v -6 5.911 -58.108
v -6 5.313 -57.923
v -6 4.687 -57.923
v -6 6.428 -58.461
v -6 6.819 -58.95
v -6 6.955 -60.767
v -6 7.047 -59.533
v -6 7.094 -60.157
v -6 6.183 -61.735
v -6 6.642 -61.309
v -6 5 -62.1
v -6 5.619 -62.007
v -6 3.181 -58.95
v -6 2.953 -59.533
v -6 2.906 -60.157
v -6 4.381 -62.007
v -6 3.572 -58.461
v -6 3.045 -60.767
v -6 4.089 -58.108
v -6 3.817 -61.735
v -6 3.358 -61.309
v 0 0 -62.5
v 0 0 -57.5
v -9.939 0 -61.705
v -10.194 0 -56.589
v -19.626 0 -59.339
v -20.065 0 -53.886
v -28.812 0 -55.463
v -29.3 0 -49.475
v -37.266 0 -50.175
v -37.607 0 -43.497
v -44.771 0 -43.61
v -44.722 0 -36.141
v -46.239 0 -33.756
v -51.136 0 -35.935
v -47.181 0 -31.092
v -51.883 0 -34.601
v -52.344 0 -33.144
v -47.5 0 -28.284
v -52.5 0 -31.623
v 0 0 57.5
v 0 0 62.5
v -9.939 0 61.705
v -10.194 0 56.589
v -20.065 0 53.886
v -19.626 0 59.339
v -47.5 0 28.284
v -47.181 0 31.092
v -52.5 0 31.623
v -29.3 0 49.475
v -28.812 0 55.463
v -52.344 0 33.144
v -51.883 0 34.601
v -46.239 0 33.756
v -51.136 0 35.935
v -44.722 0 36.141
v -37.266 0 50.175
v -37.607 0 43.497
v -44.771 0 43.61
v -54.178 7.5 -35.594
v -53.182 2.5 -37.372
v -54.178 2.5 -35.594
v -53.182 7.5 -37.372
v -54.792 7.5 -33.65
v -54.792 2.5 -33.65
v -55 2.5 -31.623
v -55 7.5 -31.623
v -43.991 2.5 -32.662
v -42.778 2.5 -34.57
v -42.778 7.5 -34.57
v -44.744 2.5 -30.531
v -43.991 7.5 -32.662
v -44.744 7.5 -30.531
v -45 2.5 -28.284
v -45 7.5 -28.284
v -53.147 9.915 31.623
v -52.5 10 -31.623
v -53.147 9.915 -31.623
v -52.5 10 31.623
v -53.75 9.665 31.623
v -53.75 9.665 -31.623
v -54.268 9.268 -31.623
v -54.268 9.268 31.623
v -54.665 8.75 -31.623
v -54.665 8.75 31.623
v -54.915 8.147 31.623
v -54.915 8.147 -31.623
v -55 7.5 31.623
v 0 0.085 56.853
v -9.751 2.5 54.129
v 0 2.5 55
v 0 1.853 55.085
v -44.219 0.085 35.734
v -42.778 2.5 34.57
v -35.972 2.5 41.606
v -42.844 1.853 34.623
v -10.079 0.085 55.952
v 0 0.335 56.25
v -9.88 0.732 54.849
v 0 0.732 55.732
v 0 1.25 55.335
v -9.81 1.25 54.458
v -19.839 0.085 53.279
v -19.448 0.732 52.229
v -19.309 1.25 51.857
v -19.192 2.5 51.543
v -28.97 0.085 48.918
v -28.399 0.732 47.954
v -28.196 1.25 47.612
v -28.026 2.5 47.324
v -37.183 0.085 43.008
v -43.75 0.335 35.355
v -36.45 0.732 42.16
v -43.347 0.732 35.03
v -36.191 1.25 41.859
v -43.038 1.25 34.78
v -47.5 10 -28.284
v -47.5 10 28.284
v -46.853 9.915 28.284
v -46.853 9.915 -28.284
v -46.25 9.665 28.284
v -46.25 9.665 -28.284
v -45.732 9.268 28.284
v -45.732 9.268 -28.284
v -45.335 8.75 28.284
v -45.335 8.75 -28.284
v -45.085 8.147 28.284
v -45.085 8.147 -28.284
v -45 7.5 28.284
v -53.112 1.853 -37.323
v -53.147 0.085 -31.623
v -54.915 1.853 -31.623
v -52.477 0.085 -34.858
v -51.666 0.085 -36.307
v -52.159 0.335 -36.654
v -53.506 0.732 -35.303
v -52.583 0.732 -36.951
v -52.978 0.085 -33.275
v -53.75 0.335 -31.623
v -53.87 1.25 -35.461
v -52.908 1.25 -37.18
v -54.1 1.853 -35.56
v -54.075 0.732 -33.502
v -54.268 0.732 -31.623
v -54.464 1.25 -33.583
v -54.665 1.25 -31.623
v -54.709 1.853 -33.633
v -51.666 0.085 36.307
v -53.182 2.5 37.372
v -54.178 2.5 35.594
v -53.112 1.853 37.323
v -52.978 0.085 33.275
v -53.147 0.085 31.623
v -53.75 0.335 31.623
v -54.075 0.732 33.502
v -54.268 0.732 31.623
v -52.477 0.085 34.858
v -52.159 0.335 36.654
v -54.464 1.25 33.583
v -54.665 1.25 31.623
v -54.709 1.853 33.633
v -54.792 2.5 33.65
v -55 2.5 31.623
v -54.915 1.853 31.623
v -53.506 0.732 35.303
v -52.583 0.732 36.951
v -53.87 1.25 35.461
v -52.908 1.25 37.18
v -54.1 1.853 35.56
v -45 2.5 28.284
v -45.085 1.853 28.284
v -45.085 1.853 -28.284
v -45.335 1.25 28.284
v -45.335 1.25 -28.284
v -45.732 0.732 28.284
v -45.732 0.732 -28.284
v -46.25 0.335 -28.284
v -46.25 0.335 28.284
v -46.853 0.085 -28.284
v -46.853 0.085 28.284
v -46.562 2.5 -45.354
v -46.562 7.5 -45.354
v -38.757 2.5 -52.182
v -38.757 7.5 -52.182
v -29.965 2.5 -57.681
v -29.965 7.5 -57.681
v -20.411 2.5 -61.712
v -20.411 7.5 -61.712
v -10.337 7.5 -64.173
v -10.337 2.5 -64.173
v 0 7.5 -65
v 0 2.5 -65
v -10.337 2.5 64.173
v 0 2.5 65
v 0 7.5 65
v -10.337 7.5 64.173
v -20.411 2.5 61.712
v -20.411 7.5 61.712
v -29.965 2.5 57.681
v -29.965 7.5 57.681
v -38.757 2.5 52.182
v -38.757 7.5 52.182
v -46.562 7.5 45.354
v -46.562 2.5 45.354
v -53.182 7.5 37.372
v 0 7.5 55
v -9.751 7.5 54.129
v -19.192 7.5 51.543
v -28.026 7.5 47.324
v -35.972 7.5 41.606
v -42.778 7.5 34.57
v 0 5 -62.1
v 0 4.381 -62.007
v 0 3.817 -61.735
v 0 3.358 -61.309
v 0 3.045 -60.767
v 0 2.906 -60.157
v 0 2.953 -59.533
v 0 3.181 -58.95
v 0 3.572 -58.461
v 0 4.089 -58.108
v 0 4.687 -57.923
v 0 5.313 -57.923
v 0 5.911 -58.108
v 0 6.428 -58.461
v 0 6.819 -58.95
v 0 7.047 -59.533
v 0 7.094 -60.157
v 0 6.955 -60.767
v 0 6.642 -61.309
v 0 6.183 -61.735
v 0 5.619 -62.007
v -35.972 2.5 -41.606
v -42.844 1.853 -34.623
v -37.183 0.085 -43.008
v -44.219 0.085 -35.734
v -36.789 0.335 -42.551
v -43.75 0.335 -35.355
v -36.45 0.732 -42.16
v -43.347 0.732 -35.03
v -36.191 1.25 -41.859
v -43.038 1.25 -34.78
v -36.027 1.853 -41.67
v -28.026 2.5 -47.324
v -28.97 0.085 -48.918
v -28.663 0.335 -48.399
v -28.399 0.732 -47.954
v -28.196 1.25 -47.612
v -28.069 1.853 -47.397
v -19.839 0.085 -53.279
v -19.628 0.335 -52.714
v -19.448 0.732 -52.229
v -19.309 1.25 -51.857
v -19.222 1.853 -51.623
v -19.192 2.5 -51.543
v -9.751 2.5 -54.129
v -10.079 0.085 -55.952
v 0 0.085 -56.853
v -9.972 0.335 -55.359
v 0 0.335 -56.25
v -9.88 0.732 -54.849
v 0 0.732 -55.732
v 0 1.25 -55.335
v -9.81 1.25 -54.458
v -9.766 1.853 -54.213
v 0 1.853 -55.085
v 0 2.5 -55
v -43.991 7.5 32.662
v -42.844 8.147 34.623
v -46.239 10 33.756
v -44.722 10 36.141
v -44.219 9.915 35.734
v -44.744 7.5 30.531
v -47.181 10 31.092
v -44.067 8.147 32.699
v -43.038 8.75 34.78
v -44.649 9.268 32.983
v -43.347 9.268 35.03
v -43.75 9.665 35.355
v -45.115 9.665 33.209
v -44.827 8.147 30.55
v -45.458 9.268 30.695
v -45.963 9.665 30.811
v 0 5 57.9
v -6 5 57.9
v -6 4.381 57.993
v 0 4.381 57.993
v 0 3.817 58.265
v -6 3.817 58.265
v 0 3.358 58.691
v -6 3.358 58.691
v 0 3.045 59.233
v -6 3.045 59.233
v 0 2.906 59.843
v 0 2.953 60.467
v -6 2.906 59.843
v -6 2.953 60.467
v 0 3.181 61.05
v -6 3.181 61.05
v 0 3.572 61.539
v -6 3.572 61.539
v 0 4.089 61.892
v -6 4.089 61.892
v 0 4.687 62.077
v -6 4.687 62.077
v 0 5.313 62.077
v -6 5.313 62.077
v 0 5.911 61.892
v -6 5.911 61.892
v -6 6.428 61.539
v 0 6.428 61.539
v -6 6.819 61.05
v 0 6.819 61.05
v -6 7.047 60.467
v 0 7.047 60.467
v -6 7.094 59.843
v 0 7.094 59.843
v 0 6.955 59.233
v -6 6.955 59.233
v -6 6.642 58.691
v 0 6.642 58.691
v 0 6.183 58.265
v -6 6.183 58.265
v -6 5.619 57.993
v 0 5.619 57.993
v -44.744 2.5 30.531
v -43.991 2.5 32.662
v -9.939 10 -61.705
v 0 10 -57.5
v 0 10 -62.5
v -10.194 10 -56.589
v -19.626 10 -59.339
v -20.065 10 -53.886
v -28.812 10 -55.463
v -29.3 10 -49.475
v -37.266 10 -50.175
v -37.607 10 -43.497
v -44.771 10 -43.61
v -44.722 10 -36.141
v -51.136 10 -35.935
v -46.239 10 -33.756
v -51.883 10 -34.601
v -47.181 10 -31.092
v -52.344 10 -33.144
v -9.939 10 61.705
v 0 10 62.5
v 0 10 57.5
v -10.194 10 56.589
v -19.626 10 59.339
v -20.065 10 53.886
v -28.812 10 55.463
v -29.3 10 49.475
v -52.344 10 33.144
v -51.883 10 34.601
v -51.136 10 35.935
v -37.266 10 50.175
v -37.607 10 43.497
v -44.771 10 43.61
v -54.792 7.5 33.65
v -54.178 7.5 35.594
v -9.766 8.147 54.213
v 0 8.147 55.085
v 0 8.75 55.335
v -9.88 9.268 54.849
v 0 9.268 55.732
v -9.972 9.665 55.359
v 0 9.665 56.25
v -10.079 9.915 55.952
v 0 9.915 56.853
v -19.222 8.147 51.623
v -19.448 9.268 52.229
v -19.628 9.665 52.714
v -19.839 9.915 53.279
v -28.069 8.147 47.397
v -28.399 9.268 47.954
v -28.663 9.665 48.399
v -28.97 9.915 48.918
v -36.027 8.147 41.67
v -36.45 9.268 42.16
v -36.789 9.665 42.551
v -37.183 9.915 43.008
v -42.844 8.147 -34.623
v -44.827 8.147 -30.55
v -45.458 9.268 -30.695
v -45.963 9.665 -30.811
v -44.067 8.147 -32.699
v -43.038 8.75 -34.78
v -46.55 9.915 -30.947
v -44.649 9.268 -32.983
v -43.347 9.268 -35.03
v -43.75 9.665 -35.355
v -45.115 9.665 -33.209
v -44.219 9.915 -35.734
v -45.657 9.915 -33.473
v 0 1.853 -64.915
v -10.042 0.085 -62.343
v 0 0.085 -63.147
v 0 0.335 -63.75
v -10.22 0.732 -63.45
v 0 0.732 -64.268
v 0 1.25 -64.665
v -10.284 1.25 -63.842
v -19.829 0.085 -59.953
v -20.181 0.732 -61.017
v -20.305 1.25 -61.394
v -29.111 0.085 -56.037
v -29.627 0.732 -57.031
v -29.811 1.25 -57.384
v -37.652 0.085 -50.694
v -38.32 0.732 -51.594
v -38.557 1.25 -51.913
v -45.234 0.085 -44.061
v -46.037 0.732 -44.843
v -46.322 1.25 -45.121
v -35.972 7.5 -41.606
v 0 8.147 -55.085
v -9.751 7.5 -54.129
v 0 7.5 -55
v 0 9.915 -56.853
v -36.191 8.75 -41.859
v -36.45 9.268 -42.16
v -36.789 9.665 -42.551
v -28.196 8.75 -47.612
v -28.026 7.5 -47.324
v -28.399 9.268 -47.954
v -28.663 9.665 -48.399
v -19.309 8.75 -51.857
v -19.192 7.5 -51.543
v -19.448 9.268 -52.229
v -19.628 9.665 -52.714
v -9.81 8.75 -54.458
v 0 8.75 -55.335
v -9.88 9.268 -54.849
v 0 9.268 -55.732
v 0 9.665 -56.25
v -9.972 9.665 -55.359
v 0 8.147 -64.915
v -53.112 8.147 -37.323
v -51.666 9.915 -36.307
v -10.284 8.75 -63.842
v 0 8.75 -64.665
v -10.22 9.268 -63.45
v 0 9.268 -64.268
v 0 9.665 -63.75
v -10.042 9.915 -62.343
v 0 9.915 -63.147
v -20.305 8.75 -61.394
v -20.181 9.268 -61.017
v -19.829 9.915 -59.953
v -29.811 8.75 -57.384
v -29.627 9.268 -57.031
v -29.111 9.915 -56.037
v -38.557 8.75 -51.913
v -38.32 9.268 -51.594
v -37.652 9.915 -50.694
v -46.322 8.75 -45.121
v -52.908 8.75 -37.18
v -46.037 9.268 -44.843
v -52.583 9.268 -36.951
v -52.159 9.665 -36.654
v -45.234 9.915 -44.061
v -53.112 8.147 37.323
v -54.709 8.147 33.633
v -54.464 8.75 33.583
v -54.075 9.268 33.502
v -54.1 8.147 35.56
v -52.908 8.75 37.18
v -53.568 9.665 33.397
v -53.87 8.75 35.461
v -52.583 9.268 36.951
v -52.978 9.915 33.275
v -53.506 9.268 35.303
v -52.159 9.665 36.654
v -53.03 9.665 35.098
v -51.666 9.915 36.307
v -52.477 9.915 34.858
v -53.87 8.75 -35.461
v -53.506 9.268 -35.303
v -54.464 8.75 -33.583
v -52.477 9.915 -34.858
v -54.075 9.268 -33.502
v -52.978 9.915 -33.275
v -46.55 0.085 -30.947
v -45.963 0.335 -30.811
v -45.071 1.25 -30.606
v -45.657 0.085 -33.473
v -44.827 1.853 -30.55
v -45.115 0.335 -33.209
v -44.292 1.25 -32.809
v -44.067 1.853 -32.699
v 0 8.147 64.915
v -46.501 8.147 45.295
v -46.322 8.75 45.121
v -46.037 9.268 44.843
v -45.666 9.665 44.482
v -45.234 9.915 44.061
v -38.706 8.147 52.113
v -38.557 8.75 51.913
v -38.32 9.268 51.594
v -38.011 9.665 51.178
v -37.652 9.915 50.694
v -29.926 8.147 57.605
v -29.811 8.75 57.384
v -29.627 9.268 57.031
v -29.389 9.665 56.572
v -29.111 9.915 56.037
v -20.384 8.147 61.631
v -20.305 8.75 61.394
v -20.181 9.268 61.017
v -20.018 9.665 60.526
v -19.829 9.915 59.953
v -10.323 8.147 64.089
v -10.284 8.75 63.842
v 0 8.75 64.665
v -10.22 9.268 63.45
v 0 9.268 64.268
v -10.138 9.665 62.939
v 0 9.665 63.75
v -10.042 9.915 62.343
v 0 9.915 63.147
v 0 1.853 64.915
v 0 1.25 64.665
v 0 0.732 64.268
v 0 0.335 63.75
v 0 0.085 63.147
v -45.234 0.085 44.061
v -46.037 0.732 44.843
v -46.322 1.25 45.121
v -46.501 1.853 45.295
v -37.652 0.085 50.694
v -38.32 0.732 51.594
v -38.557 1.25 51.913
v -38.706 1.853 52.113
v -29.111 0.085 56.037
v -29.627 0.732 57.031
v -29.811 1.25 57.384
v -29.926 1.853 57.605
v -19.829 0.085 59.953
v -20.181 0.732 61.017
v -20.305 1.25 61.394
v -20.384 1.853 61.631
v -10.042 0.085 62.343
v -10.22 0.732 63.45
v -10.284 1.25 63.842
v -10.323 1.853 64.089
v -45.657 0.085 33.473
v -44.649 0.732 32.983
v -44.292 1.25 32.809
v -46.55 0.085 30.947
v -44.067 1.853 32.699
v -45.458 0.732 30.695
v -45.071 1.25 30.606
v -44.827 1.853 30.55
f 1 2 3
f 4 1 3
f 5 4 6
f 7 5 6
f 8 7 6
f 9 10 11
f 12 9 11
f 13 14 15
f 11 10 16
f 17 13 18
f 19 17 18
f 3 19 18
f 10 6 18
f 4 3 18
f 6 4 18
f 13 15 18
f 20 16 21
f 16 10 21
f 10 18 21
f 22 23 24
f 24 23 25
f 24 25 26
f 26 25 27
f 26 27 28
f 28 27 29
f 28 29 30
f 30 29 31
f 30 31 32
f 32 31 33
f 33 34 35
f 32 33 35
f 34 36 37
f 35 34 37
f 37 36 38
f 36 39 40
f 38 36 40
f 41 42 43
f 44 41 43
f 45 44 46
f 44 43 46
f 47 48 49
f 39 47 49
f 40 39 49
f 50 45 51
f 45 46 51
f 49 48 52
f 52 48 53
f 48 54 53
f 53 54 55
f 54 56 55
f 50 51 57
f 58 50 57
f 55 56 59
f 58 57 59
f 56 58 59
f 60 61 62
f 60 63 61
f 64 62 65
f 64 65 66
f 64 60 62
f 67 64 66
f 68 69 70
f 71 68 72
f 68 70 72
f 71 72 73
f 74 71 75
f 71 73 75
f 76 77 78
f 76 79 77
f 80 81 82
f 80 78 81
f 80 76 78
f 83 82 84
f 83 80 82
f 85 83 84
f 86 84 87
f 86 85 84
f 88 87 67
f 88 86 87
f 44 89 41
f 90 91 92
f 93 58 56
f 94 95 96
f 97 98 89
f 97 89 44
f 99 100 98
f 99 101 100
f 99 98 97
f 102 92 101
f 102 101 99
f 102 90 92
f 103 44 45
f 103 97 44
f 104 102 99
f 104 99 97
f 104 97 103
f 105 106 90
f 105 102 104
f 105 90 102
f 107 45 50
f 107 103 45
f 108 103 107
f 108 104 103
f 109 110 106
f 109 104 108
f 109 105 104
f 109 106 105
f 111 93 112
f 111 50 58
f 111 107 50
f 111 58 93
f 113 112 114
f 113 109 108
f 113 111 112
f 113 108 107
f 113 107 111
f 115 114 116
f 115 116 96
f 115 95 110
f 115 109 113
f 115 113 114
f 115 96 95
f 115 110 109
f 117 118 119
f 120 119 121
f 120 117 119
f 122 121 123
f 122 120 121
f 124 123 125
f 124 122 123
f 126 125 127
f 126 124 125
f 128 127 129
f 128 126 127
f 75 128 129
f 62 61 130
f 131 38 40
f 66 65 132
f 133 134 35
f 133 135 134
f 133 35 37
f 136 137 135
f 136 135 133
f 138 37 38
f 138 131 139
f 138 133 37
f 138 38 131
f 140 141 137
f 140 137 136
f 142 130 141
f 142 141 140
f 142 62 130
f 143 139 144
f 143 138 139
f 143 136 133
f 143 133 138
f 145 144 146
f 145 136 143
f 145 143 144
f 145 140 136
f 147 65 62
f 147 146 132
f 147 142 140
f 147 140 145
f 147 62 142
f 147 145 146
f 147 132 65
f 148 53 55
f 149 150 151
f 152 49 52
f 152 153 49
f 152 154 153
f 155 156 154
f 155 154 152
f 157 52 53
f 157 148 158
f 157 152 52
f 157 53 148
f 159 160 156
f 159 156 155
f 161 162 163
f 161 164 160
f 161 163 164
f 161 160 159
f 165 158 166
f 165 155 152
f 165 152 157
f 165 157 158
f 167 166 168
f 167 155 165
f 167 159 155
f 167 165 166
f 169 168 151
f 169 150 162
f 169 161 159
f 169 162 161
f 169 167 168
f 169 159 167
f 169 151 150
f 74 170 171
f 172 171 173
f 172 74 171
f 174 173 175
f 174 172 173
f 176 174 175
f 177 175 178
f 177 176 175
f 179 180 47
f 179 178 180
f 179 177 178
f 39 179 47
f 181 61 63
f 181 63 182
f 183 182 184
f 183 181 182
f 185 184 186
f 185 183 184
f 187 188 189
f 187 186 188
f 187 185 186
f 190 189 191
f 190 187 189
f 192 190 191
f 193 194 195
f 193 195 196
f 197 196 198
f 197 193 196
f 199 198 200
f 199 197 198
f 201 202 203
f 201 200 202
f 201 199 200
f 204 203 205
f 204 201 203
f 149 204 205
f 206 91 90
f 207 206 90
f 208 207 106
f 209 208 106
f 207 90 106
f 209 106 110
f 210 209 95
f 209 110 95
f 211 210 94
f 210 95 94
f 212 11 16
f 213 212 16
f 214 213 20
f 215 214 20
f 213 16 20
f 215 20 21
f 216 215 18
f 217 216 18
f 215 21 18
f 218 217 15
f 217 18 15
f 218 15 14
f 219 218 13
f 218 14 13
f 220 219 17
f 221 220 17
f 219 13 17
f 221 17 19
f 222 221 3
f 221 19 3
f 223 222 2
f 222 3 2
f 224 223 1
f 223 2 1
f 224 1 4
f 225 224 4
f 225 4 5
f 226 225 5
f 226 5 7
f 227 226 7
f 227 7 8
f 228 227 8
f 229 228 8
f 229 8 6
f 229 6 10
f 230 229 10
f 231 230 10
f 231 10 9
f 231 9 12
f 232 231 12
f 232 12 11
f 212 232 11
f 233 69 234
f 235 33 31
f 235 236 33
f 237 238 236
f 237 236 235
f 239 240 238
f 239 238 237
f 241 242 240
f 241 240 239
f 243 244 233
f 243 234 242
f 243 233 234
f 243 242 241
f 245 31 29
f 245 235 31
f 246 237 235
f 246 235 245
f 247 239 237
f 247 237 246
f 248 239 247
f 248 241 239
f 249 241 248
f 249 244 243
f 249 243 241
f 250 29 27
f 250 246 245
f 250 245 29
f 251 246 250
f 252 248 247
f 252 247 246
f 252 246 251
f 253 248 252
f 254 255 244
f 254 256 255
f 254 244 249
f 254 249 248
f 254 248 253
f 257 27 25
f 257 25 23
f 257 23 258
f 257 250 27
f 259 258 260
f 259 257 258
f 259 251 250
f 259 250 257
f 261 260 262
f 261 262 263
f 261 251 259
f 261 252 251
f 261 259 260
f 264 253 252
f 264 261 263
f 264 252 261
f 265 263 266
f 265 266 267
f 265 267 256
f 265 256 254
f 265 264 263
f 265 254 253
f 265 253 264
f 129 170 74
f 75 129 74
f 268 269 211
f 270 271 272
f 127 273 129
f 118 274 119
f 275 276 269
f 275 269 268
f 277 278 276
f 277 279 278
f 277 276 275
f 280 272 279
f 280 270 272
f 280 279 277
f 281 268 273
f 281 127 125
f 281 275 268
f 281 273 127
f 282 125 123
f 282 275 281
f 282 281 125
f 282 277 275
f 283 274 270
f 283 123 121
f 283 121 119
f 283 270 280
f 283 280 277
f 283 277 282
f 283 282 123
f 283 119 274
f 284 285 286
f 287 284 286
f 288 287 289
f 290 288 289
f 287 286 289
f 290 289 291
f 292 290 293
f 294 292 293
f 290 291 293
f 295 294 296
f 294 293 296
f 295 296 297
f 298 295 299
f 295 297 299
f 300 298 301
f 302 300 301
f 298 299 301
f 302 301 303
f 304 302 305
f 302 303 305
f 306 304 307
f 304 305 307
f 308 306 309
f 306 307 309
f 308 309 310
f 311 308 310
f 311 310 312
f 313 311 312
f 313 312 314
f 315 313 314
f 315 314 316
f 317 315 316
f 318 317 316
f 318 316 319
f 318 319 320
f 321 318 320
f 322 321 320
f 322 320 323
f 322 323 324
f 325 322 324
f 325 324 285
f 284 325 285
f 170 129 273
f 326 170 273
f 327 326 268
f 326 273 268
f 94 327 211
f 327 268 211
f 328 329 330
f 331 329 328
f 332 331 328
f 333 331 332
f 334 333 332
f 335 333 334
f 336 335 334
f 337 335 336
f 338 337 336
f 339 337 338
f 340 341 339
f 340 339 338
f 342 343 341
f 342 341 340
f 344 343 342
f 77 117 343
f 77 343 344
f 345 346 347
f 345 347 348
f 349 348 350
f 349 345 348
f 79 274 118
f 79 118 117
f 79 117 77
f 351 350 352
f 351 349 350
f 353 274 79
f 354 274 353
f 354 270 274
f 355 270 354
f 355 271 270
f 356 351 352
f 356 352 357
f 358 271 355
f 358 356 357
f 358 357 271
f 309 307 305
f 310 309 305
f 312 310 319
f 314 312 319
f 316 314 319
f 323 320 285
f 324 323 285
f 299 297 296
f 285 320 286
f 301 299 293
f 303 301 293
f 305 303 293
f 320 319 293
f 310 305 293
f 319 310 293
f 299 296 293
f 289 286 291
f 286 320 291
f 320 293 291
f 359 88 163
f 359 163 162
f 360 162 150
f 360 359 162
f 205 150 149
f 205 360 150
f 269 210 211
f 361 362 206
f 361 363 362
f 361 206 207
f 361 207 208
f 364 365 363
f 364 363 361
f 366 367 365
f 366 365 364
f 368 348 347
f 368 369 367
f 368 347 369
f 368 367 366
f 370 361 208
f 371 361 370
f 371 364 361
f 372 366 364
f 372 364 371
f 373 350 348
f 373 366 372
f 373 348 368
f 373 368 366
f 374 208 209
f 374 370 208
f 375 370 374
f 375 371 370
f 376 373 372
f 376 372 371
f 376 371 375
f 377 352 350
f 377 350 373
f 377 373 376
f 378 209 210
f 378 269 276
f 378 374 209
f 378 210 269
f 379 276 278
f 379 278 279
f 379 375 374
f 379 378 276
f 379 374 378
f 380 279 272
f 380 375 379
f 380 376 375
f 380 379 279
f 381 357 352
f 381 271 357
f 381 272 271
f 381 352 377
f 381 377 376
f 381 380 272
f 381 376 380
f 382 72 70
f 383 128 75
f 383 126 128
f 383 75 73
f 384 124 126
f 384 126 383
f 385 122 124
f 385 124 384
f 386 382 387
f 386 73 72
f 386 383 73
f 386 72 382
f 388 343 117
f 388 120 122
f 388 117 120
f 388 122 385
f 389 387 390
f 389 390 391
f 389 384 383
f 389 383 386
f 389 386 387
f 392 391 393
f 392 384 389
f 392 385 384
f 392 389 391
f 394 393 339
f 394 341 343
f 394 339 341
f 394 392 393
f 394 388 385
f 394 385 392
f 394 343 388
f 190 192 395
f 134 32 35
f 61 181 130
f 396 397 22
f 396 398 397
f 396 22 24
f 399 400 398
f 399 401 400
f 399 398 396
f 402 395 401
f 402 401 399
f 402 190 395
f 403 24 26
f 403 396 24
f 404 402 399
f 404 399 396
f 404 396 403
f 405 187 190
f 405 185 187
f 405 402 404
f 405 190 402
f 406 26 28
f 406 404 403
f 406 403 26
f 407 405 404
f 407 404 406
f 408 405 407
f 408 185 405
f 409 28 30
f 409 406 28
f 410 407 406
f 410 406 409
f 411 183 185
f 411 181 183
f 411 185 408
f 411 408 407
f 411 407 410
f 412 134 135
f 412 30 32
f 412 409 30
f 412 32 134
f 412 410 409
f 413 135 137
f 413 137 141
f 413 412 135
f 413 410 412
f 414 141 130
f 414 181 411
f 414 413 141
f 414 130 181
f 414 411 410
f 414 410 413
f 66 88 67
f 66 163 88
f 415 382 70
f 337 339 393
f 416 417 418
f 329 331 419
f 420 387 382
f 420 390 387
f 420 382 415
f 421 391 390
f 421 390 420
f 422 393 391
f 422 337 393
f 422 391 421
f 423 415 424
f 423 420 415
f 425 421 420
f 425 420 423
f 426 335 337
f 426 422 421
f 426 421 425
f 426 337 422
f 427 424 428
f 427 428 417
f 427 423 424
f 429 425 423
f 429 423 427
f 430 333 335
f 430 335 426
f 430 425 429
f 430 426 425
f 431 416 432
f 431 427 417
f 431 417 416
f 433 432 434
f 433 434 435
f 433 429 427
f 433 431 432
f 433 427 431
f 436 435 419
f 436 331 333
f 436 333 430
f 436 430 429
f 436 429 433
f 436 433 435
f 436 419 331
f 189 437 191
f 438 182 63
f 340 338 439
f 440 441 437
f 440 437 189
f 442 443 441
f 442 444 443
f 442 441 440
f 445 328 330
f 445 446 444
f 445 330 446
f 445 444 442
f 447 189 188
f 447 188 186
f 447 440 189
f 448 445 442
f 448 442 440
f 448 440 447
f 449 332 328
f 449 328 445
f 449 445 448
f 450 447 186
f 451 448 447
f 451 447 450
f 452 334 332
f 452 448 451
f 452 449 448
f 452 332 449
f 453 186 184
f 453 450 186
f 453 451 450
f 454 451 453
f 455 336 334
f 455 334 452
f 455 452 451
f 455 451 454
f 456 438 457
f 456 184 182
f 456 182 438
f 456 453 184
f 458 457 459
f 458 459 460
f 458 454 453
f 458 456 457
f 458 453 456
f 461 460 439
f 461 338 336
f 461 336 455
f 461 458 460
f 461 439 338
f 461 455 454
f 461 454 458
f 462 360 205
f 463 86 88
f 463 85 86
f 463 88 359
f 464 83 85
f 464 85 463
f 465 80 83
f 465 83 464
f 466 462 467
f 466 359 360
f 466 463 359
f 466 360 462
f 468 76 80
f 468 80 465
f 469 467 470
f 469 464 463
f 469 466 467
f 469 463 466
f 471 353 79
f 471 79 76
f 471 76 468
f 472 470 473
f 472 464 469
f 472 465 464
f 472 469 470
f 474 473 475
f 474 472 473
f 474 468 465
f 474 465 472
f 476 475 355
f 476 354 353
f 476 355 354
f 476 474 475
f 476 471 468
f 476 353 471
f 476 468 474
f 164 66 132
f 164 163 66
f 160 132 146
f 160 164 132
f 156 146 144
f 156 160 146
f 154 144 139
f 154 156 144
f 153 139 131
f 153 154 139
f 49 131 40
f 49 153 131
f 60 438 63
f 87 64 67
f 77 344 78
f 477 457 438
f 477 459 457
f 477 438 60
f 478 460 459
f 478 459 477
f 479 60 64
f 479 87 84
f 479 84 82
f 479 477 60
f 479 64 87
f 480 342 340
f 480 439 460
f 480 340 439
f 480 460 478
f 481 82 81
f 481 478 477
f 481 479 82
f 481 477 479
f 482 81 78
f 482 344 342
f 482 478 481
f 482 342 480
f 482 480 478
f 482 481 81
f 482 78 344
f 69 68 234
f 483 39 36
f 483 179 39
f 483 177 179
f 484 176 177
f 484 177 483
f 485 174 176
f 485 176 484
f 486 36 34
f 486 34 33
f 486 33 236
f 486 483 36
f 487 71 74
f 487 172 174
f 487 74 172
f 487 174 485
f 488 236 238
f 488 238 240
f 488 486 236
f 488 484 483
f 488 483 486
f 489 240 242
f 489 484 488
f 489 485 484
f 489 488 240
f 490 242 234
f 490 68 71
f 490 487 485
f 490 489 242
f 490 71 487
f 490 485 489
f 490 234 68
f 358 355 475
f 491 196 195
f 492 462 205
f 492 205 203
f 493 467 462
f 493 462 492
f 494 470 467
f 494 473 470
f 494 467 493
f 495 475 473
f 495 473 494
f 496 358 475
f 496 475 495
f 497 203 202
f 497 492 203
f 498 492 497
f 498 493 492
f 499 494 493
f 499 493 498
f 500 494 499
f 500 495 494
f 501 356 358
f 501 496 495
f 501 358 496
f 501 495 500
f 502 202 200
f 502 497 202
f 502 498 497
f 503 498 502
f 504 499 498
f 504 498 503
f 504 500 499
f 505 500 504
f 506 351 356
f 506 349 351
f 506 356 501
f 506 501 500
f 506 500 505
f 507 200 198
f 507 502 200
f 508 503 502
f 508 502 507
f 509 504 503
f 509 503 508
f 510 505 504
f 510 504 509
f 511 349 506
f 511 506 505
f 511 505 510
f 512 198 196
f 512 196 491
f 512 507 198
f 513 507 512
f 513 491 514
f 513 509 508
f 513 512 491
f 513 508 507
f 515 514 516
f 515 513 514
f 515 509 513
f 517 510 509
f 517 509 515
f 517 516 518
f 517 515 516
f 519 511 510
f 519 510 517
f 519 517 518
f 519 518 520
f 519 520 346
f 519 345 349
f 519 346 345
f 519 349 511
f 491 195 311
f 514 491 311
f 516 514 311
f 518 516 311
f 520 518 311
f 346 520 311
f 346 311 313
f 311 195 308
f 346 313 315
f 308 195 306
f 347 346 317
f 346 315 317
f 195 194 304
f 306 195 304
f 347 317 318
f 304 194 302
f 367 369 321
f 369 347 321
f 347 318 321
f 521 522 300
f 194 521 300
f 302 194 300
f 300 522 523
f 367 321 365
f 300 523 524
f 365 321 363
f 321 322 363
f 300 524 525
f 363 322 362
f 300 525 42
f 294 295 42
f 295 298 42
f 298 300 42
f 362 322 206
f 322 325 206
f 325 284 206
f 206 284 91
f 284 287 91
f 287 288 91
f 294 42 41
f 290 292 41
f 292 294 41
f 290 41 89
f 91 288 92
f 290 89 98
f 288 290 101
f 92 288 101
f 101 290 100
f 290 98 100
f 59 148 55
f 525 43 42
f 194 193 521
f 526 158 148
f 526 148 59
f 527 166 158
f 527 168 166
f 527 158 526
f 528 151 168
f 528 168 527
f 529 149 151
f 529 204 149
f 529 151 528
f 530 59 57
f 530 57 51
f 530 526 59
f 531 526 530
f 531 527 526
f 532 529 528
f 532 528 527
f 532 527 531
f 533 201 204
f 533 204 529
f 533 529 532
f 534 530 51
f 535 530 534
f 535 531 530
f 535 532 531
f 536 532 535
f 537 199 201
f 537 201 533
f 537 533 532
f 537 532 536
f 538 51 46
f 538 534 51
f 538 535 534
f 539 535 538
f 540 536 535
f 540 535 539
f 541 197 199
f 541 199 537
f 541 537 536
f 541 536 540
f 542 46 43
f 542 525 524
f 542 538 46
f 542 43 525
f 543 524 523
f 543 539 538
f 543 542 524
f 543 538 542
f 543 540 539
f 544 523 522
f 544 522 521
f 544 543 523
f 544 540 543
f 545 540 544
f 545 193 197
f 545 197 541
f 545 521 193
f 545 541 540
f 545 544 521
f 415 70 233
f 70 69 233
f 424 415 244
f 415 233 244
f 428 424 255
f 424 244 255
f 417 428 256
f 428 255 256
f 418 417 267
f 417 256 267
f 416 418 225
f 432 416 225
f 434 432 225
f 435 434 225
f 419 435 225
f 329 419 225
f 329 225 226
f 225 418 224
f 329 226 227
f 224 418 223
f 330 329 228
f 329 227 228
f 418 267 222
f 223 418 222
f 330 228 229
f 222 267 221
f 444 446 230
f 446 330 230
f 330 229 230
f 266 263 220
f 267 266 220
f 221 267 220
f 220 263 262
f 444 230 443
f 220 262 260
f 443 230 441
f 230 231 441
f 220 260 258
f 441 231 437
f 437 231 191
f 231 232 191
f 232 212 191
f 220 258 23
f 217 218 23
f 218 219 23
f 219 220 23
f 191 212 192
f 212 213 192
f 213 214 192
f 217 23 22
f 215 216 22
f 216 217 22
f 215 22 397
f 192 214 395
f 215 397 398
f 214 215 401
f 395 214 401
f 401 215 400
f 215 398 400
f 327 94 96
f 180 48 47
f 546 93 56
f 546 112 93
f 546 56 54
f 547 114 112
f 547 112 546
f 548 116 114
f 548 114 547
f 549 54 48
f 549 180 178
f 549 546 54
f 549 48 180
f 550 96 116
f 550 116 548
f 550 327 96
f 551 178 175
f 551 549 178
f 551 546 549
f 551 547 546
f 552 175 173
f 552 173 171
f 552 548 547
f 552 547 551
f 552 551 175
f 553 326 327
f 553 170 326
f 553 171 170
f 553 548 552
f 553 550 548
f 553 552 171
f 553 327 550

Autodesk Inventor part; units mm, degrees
ref_plane "YZ Plane" through (0, 0, 0) normal (1, 0, 0) x (0, 1, 0)
ref_plane "XZ Plane" through (0, 0, 0) normal (0, 1, 0) x (-1, 0, 0)
ref_plane "XY Plane" through (0, 0, 0) normal (0, 0, 1) x (1, 0, 0)
sketch "Sketch1" plane through (0, 0, 0) normal (0, 1, 0) x (-1, 0, 0)
  arc A0 (0, -60) -> (0, 60) centre (0, 0) ccw construction
  arc A1 (0, -55) -> (0, 55) centre (0, 0) ccw
  arc A2 (0, -65) -> (0, 65) centre (0, 0) ccw
  line L0 (0, 65) -> (0, 55)
  line L1 (0, -55) -> (0, -65)
  line L2 (0, 65) -> (0, -65)
  line L3 (50, 41.5331) -> (50, -41.5331)
  line L4 (45, 46.9042) -> (45, -46.9042)
  line L5 (55, 34.641) -> (55, -34.641)
  point P0 (45, 31.6228)
  point P1 (45, -31.6228)
  dimension "d16" = 60
  dimension "d17" = 5
  dimension "d18" = 5
  dimension "d19" = 10
  dimension "d20" = 10
  dimension "d21" = 0
  dimension "d25" = 5
  dimension "d26" = 5
  dimension "d27" = 55
  dimension "d28" = 55
extrude "Extrusion1" add sketch "Sketch1" along normal blind 10 contours A1 L4 A2 L1 | L4 A1 L3 | A1 L3 A2 L4 | L0 A2 L4 A1 | L3 A1 | A1 L5 A2 L3 | L4 A2 L3 A1 | A1 L3 A2 L5
fillet "Fillet1" radius 10 2 edges at (-45, 5, -31.6228) (-45, 5, 31.6228)
fillet "Fillet2" radius 10 2 edges at (-55, 5, 34.641) (-55, 5, -34.641)
fillet "Fillet3" radius 2.5 16 edges at (-54.5346, 10, 34.6379) (-55, 10, 0) (-54.5346, 10, -34.6379) (-29.9649, 10, -57.681) (-29.9649, 10, 57.681) (-54.5346, 0, 34.6379) (-55, 0, 0) (-54.5346, 0, -34.6379) (-29.9649, 0, -57.681) (-29.9649, 0, 57.681) (-45, 10, 0) (-23.703, 10, -49.6303) (-23.703, 10, 49.6303) (-45, 0, 0) (-23.703, 0, -49.6303) (-23.703, 0, 49.6303)
sketch "Sketch2" plane through (0, 0, 62.5) normal (1, 0, 0) x (0, 0, -1)
  line L0 (7.5, 2.5) -> (7.5, 7.5) projected
  line L1 (0, 10) -> (5, 10) projected
  line L2 (-2.5, 2.5) -> (-2.5, 7.5) projected
  line L3 (0, 0) -> (5, 0) projected
  line L4 (120, 0) -> (125, 0) projected
  line L5 (127.5, 2.5) -> (127.5, 7.5) projected
  line L6 (120, 10) -> (125, 10) projected
  line L7 (117.5, 2.5) -> (117.5, 7.5) projected
  arc A0 (117.5, 2.5) -> (120, 0) centre (120, 2.5) ccw projected
  arc A1 (125, 0) -> (127.5, 2.5) centre (125, 2.5) ccw projected
  arc A2 (127.5, 7.5) -> (125, 10) centre (125, 7.5) ccw projected
  arc A3 (120, 10) -> (117.5, 7.5) centre (120, 7.5) ccw projected
  arc A4 (5, 0) -> (7.5, 2.5) centre (5, 2.5) ccw projected
  arc A5 (7.5, 7.5) -> (5, 10) centre (5, 7.5) ccw projected
  arc A6 (0, 10) -> (-2.5, 7.5) centre (0, 7.5) ccw projected
  arc A7 (-2.5, 2.5) -> (0, 0) centre (0, 2.5) ccw projected
  point P0 (122.5, 5)
  point P1 (2.5, 5)
hole "Hole1" at (0, 5, -60) at (0, 5, 60) direction (-1, 0, 0) diameter 4.2 depth 6
equation "\"d18\" = d17"
equation "\"d19\" = 2 * d17"
equation "\"d20\" = 2 * d17"
equation "\"d25\" = d17"
equation "\"d26\" = d17"
equation "\"d28\" = d27"
equation "\"d29\" = 2 * d17"
properties part number "Handle"
